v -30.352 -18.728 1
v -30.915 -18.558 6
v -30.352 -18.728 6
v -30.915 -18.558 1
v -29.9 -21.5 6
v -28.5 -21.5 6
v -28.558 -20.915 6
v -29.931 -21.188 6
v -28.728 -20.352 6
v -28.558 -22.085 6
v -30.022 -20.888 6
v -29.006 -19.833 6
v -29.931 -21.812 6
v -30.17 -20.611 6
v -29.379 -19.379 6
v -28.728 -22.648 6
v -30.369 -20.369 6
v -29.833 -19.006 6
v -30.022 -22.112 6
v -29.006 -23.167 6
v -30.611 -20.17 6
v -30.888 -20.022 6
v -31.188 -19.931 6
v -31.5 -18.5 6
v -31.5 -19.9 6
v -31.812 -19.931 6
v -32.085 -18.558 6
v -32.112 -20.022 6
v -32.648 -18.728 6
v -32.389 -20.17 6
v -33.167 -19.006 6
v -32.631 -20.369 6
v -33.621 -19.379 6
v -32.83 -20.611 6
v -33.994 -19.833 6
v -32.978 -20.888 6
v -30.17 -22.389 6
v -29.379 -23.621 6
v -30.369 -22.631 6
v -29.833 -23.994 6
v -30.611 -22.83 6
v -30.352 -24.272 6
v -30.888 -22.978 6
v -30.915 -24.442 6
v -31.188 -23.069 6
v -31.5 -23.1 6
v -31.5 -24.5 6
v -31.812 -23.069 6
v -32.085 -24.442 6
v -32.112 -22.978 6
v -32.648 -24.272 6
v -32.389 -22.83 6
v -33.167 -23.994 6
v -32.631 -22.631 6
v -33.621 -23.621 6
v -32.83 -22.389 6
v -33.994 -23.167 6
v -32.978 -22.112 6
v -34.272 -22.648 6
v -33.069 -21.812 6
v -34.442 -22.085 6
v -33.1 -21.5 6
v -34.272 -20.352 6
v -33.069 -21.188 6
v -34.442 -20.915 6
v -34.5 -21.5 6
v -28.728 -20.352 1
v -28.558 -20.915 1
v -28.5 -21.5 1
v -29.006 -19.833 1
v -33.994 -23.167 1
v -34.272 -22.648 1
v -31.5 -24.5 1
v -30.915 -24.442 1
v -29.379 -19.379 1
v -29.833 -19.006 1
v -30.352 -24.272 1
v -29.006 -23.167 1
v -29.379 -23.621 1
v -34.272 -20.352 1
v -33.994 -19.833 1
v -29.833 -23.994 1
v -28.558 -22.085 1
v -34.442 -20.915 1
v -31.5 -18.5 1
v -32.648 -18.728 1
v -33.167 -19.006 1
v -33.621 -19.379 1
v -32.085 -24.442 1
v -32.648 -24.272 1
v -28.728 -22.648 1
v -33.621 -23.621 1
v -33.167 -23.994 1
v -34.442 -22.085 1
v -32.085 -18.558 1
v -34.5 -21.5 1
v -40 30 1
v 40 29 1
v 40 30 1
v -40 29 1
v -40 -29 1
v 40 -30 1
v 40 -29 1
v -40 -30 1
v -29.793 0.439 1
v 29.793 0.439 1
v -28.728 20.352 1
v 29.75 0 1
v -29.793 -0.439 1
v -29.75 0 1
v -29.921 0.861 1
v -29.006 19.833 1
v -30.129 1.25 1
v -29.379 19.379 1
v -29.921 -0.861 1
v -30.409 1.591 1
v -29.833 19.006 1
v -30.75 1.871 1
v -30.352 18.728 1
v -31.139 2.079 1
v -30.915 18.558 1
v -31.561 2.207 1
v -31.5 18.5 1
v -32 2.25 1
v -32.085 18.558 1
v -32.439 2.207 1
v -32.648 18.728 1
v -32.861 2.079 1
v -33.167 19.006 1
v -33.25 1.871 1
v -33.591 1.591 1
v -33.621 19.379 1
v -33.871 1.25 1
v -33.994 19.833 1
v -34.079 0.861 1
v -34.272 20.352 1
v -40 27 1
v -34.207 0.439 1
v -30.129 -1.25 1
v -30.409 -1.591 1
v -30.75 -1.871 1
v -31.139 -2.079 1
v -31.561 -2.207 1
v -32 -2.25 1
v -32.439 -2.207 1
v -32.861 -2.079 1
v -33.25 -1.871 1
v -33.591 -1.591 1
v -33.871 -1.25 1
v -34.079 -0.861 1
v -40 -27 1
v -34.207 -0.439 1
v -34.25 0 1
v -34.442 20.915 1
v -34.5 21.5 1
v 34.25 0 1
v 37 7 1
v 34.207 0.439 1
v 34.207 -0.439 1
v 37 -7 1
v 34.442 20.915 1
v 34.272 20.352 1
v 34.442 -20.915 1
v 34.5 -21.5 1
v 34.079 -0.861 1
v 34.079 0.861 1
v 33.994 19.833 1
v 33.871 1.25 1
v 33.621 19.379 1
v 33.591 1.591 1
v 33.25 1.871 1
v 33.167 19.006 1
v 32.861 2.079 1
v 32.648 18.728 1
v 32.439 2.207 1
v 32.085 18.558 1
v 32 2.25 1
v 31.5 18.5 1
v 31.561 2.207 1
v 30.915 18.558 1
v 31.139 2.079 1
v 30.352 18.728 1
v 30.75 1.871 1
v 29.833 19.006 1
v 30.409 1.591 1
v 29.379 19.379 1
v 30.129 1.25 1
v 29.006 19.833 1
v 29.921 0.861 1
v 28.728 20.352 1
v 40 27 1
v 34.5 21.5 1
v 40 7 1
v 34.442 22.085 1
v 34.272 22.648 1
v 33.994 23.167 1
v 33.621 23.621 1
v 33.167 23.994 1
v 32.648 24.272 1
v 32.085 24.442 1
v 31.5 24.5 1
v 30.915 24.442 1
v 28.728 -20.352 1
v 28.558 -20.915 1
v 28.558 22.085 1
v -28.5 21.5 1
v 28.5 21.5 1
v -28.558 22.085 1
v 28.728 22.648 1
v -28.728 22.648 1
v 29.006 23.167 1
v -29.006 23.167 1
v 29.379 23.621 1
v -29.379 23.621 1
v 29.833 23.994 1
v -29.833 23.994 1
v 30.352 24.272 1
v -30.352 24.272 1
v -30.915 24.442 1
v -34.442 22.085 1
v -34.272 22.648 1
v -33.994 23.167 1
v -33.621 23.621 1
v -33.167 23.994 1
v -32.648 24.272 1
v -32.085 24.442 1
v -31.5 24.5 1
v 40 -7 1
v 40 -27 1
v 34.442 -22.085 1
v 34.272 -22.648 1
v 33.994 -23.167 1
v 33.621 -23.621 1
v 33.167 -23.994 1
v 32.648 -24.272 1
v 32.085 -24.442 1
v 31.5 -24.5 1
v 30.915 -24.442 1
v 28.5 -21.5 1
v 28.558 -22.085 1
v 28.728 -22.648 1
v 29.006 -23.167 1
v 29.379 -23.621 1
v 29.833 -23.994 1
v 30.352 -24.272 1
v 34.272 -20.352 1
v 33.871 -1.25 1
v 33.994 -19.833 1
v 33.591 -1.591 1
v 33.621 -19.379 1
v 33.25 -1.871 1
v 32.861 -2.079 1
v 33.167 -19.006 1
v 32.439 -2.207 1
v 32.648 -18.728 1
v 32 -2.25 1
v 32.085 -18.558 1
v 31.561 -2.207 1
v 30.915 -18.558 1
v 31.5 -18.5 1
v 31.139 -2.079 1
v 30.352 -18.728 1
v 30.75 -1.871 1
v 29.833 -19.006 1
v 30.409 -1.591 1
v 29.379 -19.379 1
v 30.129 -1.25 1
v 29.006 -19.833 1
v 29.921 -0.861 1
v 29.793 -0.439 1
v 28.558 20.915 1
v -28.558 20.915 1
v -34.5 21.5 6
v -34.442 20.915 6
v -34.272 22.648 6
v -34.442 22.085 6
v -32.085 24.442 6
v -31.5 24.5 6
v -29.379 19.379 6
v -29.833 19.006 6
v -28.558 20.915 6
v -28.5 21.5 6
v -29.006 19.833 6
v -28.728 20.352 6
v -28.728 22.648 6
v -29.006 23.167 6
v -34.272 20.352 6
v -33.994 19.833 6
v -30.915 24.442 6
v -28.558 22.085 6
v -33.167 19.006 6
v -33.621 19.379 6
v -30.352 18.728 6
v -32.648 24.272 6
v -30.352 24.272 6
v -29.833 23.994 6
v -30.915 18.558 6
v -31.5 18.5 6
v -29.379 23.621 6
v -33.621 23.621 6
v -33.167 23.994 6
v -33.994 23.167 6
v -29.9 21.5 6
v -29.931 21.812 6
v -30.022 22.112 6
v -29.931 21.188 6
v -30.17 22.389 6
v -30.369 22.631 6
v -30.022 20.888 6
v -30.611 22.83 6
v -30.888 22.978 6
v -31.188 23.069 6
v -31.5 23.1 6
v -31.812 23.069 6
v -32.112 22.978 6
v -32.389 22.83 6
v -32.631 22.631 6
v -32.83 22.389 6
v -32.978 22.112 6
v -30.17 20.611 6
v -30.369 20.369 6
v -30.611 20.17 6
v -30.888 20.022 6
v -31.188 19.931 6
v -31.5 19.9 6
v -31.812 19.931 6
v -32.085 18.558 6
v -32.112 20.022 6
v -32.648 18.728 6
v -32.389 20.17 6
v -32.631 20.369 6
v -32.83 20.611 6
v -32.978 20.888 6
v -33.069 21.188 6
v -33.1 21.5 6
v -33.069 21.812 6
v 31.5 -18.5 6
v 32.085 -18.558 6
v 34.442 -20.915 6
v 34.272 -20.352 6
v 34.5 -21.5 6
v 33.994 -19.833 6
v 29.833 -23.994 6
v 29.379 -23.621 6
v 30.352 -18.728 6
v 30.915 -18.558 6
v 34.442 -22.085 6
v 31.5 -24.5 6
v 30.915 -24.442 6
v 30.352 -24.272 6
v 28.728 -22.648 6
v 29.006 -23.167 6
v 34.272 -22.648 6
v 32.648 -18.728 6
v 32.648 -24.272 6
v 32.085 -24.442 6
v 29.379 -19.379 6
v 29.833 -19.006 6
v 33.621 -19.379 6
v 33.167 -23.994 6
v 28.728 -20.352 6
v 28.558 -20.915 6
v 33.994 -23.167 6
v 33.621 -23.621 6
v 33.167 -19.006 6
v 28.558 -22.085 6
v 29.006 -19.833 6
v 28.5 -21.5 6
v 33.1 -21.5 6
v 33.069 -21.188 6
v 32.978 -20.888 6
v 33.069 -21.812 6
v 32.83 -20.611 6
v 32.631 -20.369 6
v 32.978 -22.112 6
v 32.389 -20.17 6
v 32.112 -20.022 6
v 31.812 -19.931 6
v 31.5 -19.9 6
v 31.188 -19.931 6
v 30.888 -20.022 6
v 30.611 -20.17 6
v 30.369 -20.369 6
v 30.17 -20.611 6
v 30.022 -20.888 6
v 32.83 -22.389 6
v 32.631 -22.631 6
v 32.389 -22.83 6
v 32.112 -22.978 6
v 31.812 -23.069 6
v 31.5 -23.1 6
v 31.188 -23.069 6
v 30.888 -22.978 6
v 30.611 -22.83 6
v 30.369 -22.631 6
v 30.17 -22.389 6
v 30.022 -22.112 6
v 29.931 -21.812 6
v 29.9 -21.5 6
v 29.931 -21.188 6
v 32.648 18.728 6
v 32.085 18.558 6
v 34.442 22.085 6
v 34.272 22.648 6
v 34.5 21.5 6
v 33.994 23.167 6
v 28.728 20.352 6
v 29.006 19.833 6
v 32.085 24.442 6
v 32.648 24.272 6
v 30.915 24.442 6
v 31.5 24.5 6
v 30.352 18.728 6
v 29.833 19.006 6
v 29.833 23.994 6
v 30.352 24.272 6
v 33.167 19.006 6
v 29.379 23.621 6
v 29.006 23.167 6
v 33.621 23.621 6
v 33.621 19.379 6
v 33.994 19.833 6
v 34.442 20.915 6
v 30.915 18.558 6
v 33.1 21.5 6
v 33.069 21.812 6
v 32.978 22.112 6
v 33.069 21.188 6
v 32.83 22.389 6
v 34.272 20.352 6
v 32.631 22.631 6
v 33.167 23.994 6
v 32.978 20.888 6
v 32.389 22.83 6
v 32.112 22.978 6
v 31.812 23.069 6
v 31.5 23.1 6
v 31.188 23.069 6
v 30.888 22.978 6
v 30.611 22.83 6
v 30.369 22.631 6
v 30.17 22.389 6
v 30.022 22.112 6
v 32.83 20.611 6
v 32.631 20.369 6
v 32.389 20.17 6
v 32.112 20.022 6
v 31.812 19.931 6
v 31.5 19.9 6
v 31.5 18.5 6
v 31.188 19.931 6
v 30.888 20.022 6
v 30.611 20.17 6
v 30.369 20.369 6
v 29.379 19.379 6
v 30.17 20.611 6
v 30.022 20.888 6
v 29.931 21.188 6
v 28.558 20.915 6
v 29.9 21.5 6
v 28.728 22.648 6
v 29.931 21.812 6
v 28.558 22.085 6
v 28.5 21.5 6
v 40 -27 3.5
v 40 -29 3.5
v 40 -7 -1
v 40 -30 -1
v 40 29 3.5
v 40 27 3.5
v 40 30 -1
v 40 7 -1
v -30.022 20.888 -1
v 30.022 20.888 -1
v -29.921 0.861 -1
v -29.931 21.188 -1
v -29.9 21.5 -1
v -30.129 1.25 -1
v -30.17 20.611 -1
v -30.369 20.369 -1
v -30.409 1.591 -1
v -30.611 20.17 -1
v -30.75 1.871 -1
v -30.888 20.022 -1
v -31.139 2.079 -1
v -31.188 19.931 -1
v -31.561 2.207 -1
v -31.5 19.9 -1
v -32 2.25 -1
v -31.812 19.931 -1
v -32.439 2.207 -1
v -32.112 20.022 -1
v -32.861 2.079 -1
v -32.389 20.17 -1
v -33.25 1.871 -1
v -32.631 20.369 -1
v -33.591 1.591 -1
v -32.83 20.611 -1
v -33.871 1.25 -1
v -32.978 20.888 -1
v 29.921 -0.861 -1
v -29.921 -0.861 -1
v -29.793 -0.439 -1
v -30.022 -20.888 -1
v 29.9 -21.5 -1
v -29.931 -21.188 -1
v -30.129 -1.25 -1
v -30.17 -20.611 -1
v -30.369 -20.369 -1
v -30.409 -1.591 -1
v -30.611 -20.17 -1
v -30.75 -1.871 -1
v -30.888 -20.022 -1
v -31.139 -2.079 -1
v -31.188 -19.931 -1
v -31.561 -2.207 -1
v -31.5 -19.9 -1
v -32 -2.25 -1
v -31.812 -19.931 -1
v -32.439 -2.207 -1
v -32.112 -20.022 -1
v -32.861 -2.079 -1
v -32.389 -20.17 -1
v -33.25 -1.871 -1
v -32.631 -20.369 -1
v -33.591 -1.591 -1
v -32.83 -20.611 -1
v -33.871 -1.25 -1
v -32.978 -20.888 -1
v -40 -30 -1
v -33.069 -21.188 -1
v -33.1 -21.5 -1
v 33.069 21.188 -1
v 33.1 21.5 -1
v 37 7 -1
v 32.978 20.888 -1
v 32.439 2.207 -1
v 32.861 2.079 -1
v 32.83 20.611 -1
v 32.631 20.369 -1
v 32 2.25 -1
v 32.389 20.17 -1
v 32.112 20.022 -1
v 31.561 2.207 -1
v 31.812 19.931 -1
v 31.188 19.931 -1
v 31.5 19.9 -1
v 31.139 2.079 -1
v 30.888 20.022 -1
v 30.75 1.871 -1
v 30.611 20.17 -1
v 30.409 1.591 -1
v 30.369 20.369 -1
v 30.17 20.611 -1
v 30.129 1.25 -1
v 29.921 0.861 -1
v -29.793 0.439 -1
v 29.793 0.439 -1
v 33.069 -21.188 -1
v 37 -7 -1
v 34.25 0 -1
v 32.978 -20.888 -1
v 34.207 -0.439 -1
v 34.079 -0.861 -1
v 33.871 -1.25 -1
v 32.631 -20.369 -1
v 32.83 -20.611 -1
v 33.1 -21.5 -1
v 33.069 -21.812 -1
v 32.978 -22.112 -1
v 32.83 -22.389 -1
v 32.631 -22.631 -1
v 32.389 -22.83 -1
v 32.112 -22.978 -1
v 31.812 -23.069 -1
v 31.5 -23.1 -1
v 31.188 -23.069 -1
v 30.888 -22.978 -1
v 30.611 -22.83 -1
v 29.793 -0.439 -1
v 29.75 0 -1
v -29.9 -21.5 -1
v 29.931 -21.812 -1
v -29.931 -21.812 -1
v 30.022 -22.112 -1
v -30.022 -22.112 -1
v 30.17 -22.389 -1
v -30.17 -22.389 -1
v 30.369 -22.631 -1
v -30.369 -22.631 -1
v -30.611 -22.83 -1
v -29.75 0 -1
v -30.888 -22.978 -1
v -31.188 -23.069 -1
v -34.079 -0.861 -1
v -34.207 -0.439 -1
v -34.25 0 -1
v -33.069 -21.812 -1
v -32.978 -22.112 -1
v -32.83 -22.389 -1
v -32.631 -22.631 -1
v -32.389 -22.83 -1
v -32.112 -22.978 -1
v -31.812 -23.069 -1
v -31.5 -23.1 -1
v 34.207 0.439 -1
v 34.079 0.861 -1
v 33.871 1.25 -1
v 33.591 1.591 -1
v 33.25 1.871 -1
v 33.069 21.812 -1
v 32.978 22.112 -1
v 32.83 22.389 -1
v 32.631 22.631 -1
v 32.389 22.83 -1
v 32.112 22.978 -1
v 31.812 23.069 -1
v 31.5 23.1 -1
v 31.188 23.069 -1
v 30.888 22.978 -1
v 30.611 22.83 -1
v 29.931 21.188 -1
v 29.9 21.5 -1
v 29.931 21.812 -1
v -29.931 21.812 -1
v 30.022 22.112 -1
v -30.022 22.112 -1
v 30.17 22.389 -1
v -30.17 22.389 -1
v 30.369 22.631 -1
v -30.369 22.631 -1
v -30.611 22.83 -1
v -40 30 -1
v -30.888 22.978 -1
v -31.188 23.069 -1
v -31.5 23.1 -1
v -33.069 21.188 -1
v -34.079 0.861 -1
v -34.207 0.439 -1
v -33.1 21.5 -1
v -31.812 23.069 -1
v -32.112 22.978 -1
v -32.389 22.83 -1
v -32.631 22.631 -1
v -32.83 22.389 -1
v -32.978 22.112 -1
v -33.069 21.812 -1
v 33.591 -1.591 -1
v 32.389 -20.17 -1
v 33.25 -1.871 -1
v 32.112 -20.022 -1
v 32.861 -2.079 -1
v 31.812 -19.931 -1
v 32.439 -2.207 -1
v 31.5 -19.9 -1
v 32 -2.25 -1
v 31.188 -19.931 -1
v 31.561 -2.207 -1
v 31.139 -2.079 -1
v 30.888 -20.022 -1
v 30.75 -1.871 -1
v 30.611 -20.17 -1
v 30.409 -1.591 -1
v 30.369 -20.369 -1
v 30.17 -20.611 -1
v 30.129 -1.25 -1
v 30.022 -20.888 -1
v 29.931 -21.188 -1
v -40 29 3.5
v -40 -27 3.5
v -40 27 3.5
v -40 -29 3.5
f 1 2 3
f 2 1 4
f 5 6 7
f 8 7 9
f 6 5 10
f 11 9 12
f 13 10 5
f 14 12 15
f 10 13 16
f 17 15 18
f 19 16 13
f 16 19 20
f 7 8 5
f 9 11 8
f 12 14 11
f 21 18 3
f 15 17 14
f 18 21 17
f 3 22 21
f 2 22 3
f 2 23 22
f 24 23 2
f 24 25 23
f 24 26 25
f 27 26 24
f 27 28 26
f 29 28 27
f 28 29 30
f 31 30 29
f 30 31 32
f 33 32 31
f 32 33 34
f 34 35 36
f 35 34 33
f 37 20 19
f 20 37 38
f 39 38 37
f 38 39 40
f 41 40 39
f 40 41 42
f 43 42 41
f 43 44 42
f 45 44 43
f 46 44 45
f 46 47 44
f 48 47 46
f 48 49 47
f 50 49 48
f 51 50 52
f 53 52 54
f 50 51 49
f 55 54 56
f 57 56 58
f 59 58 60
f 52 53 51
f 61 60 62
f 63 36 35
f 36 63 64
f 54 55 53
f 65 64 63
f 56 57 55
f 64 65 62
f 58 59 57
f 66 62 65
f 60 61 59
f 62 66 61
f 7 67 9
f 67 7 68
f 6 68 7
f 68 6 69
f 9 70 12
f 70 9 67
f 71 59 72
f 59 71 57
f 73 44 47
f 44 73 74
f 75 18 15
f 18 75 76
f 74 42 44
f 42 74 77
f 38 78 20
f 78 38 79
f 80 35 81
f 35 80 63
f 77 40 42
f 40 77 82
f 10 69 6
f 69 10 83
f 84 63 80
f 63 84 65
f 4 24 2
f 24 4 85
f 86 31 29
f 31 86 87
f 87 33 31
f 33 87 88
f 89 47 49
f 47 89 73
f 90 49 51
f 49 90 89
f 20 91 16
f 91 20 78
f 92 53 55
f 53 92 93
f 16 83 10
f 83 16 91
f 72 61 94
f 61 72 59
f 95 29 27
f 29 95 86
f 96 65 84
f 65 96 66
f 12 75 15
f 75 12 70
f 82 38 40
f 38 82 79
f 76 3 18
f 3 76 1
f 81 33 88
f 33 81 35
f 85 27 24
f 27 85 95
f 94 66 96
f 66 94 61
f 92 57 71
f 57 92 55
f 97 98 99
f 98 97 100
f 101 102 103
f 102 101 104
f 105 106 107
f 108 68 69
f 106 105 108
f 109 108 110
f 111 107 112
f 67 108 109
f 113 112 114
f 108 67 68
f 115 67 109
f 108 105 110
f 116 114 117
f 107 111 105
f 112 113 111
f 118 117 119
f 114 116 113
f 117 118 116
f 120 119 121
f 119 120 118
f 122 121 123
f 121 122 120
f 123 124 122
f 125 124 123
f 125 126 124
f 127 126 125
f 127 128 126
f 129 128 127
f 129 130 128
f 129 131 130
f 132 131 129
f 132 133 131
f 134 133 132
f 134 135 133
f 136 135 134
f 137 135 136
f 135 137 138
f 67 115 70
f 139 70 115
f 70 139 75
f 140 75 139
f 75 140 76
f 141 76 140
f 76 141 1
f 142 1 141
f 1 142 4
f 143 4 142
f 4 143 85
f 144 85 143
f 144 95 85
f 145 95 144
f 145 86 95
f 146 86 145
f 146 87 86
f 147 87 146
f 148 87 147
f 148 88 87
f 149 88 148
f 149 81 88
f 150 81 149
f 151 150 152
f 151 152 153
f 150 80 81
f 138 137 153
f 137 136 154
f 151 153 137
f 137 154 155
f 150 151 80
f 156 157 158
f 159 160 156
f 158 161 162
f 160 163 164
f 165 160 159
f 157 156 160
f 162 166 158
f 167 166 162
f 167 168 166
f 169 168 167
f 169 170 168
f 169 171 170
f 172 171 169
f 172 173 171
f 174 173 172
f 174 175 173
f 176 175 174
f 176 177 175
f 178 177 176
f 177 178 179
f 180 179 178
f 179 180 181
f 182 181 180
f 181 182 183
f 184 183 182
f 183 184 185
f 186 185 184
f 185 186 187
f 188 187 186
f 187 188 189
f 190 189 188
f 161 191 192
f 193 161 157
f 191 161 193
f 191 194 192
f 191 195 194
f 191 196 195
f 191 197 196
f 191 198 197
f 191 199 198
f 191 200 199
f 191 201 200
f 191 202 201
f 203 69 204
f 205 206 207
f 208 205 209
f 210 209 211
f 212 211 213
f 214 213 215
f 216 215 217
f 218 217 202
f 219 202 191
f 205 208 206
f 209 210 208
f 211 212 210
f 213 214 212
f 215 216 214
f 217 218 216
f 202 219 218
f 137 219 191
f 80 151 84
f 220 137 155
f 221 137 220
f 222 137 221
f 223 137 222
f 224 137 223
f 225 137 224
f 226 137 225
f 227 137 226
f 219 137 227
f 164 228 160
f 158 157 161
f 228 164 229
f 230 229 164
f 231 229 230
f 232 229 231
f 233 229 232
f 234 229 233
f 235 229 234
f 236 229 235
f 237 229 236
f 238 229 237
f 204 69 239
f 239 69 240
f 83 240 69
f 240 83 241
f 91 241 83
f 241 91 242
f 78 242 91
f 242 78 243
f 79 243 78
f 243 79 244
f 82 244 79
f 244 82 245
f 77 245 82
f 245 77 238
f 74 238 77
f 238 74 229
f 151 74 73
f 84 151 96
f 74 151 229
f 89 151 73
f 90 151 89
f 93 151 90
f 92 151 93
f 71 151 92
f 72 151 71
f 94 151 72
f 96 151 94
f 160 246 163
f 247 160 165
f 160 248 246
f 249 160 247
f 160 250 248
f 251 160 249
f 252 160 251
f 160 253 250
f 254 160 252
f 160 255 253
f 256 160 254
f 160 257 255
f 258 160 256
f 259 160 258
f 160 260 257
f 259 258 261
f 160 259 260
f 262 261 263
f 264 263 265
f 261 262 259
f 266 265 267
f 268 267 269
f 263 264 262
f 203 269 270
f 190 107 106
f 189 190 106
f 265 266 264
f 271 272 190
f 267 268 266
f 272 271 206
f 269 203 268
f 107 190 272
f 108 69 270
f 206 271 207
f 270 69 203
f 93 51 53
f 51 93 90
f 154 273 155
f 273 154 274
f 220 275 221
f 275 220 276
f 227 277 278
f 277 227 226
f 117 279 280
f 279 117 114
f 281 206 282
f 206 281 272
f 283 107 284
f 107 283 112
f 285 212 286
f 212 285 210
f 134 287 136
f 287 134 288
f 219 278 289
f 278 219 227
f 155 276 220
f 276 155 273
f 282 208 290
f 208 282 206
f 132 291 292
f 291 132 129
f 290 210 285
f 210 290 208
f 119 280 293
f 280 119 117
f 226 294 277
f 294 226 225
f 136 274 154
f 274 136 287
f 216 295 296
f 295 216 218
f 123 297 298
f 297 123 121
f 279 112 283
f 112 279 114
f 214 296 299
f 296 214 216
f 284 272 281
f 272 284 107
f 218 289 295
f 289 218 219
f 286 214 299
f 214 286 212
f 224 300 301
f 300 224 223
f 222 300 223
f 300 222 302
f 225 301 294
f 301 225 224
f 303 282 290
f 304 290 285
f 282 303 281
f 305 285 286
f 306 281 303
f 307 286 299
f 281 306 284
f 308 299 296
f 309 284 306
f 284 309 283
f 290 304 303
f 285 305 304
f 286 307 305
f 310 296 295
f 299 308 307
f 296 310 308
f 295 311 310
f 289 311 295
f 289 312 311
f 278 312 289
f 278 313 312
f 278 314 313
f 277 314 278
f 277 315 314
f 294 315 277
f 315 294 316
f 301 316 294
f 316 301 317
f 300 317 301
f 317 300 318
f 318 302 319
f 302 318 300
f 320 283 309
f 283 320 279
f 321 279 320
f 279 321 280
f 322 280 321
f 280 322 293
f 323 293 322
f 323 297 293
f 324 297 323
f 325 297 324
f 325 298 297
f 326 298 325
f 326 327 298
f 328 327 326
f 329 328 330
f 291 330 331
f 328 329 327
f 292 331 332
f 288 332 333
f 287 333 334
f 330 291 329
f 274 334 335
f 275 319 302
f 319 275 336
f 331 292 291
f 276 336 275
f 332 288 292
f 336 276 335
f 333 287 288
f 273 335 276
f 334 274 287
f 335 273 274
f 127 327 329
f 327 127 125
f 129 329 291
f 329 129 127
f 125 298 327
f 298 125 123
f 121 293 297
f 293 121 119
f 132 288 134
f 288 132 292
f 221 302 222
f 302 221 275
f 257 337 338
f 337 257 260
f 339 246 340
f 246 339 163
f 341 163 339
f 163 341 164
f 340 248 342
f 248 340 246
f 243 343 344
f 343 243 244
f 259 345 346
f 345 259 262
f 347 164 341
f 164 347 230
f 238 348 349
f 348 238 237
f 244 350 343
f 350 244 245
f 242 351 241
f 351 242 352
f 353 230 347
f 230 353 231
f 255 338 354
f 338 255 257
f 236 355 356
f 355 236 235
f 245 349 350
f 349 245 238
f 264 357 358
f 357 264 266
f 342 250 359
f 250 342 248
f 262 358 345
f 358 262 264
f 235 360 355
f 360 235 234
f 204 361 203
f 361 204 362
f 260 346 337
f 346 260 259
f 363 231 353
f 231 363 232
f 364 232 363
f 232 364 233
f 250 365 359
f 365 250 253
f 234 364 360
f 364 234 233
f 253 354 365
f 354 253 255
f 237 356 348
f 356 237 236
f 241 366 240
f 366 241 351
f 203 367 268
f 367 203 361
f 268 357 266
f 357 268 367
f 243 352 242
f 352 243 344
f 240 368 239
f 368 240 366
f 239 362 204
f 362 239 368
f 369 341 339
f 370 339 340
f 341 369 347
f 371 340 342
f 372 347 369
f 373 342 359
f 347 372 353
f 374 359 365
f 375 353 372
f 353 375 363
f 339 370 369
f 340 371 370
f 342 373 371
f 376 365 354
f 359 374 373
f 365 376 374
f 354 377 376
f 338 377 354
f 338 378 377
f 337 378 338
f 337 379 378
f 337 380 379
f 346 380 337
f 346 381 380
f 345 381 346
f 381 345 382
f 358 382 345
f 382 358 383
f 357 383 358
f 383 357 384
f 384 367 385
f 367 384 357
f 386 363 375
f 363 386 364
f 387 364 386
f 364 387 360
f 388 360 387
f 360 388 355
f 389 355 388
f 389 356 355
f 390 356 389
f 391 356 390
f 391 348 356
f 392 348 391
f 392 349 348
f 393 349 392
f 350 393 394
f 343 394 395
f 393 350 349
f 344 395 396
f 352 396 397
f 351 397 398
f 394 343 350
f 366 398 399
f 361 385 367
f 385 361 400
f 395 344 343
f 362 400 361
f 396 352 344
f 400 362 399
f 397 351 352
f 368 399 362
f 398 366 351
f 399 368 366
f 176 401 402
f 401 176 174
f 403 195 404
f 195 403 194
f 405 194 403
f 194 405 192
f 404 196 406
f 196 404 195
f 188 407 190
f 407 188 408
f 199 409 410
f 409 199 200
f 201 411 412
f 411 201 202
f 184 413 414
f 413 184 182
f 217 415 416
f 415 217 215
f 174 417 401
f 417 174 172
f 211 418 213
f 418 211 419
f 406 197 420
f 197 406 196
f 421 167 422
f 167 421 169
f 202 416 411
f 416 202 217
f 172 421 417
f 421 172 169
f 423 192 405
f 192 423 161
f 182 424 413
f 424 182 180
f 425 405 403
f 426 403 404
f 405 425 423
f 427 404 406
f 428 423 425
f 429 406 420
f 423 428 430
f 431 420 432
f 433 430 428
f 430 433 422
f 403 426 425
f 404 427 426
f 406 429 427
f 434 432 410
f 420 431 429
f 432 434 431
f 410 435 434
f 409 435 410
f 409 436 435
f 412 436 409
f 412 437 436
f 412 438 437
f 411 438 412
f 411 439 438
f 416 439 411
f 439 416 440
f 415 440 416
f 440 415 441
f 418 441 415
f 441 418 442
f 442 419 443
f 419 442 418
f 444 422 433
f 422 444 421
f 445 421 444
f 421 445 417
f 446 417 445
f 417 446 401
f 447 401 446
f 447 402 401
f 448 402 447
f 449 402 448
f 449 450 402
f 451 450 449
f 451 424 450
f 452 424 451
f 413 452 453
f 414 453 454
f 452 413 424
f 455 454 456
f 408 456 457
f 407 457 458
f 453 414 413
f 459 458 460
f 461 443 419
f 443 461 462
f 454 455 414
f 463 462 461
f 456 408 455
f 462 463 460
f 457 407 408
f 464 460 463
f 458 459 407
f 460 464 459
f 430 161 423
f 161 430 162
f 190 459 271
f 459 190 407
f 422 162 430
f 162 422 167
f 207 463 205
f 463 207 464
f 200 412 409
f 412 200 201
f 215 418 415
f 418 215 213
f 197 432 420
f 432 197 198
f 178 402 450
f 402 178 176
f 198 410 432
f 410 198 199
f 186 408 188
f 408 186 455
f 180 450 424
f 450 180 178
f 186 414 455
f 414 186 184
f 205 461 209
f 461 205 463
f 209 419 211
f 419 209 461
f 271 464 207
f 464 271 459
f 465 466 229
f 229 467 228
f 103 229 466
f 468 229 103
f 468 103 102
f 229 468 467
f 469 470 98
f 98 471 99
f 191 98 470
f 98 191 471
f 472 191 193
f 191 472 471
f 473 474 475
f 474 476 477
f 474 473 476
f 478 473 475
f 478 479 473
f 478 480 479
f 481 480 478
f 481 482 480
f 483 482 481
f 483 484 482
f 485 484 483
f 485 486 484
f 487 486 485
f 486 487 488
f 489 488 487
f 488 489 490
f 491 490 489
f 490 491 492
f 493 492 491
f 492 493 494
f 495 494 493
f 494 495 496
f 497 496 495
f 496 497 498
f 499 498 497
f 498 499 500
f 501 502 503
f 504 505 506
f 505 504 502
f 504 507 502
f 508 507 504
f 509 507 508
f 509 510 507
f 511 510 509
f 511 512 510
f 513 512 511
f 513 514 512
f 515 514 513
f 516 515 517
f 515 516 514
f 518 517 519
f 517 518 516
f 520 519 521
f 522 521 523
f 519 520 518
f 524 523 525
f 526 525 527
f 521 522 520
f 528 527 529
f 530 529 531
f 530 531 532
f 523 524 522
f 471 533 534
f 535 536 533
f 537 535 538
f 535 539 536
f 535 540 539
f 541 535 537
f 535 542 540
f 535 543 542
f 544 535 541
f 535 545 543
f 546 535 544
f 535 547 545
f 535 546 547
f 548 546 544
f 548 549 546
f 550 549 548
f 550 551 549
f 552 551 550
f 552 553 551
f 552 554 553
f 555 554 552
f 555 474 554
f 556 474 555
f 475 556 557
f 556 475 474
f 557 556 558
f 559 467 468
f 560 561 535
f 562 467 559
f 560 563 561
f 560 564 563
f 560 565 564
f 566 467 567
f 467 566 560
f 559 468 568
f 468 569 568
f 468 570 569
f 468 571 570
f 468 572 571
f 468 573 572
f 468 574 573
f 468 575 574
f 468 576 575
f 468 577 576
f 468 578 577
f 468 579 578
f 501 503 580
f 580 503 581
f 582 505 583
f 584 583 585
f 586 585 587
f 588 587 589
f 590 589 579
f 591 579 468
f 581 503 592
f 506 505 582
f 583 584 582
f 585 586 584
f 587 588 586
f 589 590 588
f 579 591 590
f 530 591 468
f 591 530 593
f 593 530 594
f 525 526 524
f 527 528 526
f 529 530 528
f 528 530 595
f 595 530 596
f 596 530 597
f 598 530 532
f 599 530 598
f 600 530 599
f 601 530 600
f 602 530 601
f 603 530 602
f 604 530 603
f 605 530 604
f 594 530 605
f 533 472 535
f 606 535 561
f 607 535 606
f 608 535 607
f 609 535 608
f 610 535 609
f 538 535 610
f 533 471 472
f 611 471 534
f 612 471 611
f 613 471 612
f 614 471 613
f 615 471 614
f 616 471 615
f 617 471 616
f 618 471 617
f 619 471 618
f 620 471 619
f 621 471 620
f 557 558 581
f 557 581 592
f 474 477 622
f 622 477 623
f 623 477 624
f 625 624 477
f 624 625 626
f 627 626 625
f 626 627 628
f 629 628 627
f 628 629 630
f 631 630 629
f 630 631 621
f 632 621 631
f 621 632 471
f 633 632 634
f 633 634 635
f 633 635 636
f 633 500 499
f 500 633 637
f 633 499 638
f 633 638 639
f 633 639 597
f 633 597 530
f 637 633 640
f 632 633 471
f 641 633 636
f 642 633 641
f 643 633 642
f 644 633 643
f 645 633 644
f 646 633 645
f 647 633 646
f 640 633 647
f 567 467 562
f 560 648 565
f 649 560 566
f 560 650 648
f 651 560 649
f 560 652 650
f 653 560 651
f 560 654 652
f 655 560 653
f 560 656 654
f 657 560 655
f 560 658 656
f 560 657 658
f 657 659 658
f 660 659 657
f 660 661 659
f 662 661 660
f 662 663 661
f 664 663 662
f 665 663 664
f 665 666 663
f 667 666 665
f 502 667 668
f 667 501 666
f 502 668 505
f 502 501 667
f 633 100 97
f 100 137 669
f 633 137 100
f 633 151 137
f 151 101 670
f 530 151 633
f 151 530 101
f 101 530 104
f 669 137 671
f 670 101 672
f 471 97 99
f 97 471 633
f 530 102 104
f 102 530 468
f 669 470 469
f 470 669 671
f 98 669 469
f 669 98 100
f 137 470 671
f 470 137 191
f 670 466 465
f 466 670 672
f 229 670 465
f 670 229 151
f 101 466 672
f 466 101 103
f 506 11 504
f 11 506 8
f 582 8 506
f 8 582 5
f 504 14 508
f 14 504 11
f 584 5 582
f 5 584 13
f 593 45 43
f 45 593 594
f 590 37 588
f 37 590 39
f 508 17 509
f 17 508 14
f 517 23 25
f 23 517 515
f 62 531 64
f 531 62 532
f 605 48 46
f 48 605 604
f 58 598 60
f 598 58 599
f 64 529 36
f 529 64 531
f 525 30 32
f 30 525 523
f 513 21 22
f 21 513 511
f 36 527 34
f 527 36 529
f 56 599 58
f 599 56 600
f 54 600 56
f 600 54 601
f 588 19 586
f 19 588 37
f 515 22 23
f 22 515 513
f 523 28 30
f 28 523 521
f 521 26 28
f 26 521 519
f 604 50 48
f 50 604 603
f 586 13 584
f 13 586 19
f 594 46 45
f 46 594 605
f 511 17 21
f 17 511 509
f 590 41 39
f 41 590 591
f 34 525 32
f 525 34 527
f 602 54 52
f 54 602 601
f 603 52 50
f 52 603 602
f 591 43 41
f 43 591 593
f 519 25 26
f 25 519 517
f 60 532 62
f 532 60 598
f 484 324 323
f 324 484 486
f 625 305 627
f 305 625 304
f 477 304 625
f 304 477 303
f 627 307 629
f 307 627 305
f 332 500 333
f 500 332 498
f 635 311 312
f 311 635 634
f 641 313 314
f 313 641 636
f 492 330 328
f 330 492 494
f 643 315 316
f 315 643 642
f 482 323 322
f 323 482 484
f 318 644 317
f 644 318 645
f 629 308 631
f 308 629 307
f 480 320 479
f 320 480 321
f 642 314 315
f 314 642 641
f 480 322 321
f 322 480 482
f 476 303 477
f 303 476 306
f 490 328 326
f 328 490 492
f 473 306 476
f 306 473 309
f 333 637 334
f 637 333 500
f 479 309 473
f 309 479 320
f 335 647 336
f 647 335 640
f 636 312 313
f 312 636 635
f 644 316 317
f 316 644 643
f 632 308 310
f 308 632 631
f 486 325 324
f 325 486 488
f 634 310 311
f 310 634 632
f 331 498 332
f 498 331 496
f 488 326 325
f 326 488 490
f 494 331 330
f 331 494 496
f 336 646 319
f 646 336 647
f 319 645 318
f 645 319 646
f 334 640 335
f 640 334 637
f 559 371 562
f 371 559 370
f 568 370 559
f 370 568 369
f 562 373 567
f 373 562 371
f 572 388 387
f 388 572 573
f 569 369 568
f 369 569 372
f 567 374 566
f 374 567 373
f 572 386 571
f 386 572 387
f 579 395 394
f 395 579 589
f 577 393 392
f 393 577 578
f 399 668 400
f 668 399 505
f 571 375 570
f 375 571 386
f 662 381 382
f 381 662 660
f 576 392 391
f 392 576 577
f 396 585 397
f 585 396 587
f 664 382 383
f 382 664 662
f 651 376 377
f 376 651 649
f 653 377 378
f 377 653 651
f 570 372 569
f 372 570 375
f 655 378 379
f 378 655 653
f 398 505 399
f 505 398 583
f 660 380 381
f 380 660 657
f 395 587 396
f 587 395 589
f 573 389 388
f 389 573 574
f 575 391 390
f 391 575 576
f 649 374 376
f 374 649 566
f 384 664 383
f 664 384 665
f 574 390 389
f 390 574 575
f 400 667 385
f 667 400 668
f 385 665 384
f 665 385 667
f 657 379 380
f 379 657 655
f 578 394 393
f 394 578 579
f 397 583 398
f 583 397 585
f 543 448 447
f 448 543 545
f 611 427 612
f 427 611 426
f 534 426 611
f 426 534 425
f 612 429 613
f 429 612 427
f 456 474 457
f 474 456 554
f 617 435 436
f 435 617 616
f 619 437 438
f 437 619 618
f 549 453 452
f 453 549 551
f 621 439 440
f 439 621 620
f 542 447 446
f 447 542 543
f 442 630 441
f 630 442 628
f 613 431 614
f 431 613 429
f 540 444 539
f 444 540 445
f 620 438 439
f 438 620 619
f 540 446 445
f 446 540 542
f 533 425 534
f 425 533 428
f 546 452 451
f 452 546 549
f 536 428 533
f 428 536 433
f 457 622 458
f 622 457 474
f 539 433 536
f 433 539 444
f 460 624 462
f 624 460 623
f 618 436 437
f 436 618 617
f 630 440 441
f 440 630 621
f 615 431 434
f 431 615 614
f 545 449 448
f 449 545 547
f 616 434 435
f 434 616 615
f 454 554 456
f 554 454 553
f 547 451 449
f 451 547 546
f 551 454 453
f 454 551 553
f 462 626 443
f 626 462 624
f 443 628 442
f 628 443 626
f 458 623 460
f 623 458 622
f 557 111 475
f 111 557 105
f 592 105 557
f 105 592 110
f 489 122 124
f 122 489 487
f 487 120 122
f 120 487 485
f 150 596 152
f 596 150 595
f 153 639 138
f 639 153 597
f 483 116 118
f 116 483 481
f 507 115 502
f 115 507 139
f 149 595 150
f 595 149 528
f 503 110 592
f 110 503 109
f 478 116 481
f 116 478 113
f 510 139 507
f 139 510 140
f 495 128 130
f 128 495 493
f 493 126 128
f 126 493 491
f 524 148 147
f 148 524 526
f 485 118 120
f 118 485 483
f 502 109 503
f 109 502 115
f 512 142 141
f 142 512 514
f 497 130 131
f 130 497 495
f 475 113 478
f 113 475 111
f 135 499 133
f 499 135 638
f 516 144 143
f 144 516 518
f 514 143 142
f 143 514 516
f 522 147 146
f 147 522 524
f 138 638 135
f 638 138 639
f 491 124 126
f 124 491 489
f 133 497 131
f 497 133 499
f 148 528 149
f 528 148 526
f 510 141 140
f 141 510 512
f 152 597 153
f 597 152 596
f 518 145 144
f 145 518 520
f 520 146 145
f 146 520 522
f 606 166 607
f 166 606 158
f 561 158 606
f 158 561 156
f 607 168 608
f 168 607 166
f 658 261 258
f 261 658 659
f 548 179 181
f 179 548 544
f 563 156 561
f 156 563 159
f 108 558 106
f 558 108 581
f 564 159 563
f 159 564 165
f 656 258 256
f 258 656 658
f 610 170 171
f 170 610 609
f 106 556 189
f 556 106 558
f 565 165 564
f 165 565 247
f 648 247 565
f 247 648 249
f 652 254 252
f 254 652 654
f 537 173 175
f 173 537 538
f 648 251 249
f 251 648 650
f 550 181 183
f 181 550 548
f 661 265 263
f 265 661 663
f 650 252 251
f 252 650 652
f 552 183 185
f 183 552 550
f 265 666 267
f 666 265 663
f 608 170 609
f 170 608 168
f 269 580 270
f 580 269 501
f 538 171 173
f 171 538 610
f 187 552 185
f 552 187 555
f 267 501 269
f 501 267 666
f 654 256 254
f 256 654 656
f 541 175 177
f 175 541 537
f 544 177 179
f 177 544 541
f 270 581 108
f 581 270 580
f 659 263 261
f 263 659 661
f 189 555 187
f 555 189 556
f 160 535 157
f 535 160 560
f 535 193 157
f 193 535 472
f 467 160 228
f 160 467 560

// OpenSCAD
// Self-Balancing Cube — PCB Tray (Nucleo F446RE)
// PCB: 70mm x 50mm
// M3 standoffs at 4 corners
// Mounts to aluminum frame bottom via T-nuts
// Print: PLA or PETG, 30% infill

$fn = 32;

pcb_l       = 70.0;
pcb_w       = 50.0;
pcb_t       = 1.6;
standoff_h  = 5.0;
standoff_d  = 6;
tray_t      = 2;
margin      = 5;

tray_l = pcb_l + 2*margin;
tray_w = pcb_w + 2*margin;

difference() {
    union() {
        // Tray base
        cube([tray_l, tray_w, tray_t], center=true);

        // Standoffs at PCB corners
        corner_x = pcb_l/2 - 3.5;
        corner_y = pcb_w/2 - 3.5;
        for (x = [-corner_x, corner_x]) {
            for (y = [-corner_y, corner_y]) {
                translate([x, y, tray_t/2])
                    cylinder(h=standoff_h, d=standoff_d);
            }
        }

        // Edge rails to retain PCB
        translate([0, tray_w/2 - 2, tray_t/2 + 1])
            cube([tray_l, 2, 3], center=true);
        translate([0, -tray_w/2 + 2, tray_t/2 + 1])
            cube([tray_l, 2, 3], center=true);
    }

    // M3 holes in standoffs
    corner_x = pcb_l/2 - 3.5;
    corner_y = pcb_w/2 - 3.5;
    for (x = [-corner_x, corner_x]) {
        for (y = [-corner_y, corner_y]) {
            translate([x, y, -1])
                cylinder(h=standoff_h + tray_t + 2, d=3.2);
        }
    }

    // USB access cutout (side)
    translate([tray_l/2, 0, tray_t/2 + 1])
        cube([6, 14, 8], center=true);

    // Frame mounting holes (M4)
    for (x = [-tray_l/2 + 8, tray_l/2 - 8]) {
        translate([x, 0, 0])
            cylinder(h=tray_t + 2, d=4.5, center=true);
    }
}
